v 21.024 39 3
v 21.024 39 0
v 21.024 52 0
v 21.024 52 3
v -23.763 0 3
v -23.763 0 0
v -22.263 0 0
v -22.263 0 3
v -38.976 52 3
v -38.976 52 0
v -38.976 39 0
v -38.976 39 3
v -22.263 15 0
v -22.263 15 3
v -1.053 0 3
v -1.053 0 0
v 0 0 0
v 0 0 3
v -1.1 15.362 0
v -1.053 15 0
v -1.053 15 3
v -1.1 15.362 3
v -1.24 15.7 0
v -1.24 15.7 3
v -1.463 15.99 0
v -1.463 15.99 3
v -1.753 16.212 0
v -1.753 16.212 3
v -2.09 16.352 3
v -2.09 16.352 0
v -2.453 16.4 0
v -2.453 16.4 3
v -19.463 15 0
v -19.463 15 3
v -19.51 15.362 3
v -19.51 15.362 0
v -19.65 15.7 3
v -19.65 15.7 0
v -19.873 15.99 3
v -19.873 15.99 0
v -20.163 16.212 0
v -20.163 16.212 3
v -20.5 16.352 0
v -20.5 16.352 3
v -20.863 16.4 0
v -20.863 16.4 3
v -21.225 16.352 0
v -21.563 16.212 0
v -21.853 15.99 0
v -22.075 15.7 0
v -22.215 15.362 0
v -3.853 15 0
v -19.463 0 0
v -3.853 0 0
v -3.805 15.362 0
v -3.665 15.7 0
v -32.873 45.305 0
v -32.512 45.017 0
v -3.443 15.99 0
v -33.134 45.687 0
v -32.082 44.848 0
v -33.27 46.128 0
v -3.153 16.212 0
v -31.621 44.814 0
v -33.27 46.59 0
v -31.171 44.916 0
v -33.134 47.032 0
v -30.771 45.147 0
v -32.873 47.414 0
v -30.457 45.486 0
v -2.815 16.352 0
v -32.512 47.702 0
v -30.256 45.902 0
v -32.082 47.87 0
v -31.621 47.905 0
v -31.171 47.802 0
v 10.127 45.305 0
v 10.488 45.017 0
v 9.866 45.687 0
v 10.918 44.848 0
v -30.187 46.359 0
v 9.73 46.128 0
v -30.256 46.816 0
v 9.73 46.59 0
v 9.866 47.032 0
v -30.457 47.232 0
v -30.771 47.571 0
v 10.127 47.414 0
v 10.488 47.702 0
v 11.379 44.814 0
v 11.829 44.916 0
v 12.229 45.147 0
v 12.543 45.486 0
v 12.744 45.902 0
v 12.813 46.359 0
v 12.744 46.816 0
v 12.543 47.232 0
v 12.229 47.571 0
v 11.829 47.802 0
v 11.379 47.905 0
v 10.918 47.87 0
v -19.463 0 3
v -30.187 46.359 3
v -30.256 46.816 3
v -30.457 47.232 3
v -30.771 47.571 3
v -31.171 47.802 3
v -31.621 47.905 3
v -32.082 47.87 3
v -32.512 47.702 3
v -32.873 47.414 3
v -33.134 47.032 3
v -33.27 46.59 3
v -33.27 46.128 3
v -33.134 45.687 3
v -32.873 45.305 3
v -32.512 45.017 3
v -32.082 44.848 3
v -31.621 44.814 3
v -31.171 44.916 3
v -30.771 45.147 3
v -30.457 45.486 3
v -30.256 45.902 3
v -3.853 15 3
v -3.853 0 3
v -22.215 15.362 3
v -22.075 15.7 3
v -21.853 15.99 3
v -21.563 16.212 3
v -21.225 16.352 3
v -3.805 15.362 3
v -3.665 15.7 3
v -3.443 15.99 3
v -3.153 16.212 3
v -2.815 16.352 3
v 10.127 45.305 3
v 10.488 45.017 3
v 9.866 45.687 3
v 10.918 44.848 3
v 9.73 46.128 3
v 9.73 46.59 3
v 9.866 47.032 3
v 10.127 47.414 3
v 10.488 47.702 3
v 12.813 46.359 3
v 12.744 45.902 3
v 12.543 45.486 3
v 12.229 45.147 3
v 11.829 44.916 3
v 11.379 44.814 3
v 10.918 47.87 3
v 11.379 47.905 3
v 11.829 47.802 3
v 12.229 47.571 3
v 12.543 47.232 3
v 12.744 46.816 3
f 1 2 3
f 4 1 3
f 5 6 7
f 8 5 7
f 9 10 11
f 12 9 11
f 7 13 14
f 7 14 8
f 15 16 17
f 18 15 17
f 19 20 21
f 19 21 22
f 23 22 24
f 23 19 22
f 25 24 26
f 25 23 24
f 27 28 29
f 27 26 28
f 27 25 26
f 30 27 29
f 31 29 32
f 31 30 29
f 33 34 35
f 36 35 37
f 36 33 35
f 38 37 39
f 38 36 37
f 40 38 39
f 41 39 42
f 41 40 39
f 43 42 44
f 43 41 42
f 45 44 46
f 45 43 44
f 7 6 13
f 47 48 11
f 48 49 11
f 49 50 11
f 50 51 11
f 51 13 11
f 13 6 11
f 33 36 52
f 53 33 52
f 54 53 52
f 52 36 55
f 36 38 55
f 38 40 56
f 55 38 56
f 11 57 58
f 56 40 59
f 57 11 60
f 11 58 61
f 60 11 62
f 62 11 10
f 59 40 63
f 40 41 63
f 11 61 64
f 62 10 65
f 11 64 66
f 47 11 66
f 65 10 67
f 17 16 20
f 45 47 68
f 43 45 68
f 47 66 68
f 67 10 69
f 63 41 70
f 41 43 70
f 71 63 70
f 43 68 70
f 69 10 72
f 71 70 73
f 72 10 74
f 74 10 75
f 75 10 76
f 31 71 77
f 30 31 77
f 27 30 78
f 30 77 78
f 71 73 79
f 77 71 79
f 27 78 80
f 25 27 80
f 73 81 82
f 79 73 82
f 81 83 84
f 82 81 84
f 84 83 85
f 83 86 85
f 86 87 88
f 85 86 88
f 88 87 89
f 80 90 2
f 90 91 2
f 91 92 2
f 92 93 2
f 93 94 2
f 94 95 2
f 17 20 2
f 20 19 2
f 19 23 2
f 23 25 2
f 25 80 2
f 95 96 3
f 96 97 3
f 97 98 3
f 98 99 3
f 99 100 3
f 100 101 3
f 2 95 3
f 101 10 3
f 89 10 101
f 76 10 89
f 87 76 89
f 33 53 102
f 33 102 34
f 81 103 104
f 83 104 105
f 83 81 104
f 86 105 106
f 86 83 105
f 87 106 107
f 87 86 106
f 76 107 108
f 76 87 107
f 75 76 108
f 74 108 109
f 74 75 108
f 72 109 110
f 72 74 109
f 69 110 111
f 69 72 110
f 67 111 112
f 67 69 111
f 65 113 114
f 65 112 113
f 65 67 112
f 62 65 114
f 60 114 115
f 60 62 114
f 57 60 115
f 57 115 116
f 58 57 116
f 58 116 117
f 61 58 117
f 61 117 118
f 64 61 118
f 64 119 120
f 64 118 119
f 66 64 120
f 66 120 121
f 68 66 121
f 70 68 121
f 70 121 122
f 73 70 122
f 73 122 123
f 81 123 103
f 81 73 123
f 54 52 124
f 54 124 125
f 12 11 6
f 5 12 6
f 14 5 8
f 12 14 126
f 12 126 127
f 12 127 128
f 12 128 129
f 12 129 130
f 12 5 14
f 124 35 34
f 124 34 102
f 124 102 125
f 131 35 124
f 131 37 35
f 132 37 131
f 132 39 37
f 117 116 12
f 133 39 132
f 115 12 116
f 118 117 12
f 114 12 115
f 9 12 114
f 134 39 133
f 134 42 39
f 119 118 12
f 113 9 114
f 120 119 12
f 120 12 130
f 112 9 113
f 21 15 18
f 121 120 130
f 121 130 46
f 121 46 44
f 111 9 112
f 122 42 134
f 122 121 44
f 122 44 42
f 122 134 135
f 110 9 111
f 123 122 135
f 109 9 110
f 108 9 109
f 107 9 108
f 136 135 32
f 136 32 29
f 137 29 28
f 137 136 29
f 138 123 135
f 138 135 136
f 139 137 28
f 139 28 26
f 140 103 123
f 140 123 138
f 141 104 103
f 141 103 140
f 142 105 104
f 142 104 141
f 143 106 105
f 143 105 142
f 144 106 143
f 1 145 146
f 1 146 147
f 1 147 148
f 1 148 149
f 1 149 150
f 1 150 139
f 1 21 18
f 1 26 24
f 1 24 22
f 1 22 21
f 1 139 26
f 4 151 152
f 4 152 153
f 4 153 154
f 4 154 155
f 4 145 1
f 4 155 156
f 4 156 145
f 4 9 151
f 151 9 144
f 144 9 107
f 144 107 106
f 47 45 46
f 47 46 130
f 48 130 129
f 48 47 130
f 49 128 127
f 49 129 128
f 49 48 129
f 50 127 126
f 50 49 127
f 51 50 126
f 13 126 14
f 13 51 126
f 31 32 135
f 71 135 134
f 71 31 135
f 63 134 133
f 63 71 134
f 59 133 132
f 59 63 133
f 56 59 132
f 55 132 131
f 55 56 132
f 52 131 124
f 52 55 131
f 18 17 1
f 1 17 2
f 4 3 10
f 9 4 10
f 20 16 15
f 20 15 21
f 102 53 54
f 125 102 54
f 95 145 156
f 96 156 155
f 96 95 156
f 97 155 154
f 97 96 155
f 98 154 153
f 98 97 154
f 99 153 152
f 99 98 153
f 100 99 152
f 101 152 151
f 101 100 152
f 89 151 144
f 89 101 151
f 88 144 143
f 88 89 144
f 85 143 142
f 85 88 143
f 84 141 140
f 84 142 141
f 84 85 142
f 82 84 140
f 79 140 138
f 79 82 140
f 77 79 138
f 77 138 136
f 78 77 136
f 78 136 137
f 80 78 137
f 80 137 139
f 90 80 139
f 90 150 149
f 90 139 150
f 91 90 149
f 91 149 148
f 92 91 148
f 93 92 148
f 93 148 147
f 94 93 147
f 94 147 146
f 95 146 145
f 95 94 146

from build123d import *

# Parameters (mm, degrees)
F3_DEPTH = 3
F1_R     = 1.55
F4_DEPTH = 25
F5_DEPTH = 25


with BuildPart() as f3:
    # F0 (on Top) → F3 (new body)
    with BuildSketch(Plane.XY):
        Polygon((21.024429, 52), (-38.975571, 52), (-38.975571, 39), (-23.762762, 0), (0, 0), (21.024429, 39), align=None)
    extrude(amount=F3_DEPTH)

    # F1 (on Top) → F4 (cut)
    with BuildSketch(Plane.XY):
        with Locations((-31.737244, 46.35926)):
            Circle(F1_R)
        with Locations((11.262756, 46.35926)):
            Circle(F1_R)
    extrude(amount=F4_DEPTH, mode=Mode.SUBTRACT)

    # F2 (on face) → F5 (cut)
    with BuildSketch(Plane.XY):
        with BuildLine():
            Line((-3.852762, 15), (-3.852762, 0))
            Line((-3.852762, 0), (-2.452762, 0))
            Line((-2.452762, 0), (-1.052762, 0))
            Line((-1.052762, 0), (-1.052762, 15))
            ThreePointArc((-1.052762, 15), (-1.462812, 15.989949), (-2.452762, 16.4))
            ThreePointArc((-2.452762, 16.4), (-3.442711, 15.989949), (-3.852762, 15))
        make_face()
        with BuildLine():
            Line((-22.262762, 15), (-22.262762, 0))
            Line((-22.262762, 0), (-20.862762, 0))
            Line((-20.862762, 0), (-19.462762, 0))
            Line((-19.462762, 0), (-19.462762, 15))
            ThreePointArc((-19.462762, 15), (-19.872812, 15.989949), (-20.862762, 16.4))
            ThreePointArc((-20.862762, 16.4), (-21.852711, 15.989949), (-22.262762, 15))
        make_face()
    extrude(amount=F5_DEPTH, mode=Mode.SUBTRACT)


solid = f3.part
